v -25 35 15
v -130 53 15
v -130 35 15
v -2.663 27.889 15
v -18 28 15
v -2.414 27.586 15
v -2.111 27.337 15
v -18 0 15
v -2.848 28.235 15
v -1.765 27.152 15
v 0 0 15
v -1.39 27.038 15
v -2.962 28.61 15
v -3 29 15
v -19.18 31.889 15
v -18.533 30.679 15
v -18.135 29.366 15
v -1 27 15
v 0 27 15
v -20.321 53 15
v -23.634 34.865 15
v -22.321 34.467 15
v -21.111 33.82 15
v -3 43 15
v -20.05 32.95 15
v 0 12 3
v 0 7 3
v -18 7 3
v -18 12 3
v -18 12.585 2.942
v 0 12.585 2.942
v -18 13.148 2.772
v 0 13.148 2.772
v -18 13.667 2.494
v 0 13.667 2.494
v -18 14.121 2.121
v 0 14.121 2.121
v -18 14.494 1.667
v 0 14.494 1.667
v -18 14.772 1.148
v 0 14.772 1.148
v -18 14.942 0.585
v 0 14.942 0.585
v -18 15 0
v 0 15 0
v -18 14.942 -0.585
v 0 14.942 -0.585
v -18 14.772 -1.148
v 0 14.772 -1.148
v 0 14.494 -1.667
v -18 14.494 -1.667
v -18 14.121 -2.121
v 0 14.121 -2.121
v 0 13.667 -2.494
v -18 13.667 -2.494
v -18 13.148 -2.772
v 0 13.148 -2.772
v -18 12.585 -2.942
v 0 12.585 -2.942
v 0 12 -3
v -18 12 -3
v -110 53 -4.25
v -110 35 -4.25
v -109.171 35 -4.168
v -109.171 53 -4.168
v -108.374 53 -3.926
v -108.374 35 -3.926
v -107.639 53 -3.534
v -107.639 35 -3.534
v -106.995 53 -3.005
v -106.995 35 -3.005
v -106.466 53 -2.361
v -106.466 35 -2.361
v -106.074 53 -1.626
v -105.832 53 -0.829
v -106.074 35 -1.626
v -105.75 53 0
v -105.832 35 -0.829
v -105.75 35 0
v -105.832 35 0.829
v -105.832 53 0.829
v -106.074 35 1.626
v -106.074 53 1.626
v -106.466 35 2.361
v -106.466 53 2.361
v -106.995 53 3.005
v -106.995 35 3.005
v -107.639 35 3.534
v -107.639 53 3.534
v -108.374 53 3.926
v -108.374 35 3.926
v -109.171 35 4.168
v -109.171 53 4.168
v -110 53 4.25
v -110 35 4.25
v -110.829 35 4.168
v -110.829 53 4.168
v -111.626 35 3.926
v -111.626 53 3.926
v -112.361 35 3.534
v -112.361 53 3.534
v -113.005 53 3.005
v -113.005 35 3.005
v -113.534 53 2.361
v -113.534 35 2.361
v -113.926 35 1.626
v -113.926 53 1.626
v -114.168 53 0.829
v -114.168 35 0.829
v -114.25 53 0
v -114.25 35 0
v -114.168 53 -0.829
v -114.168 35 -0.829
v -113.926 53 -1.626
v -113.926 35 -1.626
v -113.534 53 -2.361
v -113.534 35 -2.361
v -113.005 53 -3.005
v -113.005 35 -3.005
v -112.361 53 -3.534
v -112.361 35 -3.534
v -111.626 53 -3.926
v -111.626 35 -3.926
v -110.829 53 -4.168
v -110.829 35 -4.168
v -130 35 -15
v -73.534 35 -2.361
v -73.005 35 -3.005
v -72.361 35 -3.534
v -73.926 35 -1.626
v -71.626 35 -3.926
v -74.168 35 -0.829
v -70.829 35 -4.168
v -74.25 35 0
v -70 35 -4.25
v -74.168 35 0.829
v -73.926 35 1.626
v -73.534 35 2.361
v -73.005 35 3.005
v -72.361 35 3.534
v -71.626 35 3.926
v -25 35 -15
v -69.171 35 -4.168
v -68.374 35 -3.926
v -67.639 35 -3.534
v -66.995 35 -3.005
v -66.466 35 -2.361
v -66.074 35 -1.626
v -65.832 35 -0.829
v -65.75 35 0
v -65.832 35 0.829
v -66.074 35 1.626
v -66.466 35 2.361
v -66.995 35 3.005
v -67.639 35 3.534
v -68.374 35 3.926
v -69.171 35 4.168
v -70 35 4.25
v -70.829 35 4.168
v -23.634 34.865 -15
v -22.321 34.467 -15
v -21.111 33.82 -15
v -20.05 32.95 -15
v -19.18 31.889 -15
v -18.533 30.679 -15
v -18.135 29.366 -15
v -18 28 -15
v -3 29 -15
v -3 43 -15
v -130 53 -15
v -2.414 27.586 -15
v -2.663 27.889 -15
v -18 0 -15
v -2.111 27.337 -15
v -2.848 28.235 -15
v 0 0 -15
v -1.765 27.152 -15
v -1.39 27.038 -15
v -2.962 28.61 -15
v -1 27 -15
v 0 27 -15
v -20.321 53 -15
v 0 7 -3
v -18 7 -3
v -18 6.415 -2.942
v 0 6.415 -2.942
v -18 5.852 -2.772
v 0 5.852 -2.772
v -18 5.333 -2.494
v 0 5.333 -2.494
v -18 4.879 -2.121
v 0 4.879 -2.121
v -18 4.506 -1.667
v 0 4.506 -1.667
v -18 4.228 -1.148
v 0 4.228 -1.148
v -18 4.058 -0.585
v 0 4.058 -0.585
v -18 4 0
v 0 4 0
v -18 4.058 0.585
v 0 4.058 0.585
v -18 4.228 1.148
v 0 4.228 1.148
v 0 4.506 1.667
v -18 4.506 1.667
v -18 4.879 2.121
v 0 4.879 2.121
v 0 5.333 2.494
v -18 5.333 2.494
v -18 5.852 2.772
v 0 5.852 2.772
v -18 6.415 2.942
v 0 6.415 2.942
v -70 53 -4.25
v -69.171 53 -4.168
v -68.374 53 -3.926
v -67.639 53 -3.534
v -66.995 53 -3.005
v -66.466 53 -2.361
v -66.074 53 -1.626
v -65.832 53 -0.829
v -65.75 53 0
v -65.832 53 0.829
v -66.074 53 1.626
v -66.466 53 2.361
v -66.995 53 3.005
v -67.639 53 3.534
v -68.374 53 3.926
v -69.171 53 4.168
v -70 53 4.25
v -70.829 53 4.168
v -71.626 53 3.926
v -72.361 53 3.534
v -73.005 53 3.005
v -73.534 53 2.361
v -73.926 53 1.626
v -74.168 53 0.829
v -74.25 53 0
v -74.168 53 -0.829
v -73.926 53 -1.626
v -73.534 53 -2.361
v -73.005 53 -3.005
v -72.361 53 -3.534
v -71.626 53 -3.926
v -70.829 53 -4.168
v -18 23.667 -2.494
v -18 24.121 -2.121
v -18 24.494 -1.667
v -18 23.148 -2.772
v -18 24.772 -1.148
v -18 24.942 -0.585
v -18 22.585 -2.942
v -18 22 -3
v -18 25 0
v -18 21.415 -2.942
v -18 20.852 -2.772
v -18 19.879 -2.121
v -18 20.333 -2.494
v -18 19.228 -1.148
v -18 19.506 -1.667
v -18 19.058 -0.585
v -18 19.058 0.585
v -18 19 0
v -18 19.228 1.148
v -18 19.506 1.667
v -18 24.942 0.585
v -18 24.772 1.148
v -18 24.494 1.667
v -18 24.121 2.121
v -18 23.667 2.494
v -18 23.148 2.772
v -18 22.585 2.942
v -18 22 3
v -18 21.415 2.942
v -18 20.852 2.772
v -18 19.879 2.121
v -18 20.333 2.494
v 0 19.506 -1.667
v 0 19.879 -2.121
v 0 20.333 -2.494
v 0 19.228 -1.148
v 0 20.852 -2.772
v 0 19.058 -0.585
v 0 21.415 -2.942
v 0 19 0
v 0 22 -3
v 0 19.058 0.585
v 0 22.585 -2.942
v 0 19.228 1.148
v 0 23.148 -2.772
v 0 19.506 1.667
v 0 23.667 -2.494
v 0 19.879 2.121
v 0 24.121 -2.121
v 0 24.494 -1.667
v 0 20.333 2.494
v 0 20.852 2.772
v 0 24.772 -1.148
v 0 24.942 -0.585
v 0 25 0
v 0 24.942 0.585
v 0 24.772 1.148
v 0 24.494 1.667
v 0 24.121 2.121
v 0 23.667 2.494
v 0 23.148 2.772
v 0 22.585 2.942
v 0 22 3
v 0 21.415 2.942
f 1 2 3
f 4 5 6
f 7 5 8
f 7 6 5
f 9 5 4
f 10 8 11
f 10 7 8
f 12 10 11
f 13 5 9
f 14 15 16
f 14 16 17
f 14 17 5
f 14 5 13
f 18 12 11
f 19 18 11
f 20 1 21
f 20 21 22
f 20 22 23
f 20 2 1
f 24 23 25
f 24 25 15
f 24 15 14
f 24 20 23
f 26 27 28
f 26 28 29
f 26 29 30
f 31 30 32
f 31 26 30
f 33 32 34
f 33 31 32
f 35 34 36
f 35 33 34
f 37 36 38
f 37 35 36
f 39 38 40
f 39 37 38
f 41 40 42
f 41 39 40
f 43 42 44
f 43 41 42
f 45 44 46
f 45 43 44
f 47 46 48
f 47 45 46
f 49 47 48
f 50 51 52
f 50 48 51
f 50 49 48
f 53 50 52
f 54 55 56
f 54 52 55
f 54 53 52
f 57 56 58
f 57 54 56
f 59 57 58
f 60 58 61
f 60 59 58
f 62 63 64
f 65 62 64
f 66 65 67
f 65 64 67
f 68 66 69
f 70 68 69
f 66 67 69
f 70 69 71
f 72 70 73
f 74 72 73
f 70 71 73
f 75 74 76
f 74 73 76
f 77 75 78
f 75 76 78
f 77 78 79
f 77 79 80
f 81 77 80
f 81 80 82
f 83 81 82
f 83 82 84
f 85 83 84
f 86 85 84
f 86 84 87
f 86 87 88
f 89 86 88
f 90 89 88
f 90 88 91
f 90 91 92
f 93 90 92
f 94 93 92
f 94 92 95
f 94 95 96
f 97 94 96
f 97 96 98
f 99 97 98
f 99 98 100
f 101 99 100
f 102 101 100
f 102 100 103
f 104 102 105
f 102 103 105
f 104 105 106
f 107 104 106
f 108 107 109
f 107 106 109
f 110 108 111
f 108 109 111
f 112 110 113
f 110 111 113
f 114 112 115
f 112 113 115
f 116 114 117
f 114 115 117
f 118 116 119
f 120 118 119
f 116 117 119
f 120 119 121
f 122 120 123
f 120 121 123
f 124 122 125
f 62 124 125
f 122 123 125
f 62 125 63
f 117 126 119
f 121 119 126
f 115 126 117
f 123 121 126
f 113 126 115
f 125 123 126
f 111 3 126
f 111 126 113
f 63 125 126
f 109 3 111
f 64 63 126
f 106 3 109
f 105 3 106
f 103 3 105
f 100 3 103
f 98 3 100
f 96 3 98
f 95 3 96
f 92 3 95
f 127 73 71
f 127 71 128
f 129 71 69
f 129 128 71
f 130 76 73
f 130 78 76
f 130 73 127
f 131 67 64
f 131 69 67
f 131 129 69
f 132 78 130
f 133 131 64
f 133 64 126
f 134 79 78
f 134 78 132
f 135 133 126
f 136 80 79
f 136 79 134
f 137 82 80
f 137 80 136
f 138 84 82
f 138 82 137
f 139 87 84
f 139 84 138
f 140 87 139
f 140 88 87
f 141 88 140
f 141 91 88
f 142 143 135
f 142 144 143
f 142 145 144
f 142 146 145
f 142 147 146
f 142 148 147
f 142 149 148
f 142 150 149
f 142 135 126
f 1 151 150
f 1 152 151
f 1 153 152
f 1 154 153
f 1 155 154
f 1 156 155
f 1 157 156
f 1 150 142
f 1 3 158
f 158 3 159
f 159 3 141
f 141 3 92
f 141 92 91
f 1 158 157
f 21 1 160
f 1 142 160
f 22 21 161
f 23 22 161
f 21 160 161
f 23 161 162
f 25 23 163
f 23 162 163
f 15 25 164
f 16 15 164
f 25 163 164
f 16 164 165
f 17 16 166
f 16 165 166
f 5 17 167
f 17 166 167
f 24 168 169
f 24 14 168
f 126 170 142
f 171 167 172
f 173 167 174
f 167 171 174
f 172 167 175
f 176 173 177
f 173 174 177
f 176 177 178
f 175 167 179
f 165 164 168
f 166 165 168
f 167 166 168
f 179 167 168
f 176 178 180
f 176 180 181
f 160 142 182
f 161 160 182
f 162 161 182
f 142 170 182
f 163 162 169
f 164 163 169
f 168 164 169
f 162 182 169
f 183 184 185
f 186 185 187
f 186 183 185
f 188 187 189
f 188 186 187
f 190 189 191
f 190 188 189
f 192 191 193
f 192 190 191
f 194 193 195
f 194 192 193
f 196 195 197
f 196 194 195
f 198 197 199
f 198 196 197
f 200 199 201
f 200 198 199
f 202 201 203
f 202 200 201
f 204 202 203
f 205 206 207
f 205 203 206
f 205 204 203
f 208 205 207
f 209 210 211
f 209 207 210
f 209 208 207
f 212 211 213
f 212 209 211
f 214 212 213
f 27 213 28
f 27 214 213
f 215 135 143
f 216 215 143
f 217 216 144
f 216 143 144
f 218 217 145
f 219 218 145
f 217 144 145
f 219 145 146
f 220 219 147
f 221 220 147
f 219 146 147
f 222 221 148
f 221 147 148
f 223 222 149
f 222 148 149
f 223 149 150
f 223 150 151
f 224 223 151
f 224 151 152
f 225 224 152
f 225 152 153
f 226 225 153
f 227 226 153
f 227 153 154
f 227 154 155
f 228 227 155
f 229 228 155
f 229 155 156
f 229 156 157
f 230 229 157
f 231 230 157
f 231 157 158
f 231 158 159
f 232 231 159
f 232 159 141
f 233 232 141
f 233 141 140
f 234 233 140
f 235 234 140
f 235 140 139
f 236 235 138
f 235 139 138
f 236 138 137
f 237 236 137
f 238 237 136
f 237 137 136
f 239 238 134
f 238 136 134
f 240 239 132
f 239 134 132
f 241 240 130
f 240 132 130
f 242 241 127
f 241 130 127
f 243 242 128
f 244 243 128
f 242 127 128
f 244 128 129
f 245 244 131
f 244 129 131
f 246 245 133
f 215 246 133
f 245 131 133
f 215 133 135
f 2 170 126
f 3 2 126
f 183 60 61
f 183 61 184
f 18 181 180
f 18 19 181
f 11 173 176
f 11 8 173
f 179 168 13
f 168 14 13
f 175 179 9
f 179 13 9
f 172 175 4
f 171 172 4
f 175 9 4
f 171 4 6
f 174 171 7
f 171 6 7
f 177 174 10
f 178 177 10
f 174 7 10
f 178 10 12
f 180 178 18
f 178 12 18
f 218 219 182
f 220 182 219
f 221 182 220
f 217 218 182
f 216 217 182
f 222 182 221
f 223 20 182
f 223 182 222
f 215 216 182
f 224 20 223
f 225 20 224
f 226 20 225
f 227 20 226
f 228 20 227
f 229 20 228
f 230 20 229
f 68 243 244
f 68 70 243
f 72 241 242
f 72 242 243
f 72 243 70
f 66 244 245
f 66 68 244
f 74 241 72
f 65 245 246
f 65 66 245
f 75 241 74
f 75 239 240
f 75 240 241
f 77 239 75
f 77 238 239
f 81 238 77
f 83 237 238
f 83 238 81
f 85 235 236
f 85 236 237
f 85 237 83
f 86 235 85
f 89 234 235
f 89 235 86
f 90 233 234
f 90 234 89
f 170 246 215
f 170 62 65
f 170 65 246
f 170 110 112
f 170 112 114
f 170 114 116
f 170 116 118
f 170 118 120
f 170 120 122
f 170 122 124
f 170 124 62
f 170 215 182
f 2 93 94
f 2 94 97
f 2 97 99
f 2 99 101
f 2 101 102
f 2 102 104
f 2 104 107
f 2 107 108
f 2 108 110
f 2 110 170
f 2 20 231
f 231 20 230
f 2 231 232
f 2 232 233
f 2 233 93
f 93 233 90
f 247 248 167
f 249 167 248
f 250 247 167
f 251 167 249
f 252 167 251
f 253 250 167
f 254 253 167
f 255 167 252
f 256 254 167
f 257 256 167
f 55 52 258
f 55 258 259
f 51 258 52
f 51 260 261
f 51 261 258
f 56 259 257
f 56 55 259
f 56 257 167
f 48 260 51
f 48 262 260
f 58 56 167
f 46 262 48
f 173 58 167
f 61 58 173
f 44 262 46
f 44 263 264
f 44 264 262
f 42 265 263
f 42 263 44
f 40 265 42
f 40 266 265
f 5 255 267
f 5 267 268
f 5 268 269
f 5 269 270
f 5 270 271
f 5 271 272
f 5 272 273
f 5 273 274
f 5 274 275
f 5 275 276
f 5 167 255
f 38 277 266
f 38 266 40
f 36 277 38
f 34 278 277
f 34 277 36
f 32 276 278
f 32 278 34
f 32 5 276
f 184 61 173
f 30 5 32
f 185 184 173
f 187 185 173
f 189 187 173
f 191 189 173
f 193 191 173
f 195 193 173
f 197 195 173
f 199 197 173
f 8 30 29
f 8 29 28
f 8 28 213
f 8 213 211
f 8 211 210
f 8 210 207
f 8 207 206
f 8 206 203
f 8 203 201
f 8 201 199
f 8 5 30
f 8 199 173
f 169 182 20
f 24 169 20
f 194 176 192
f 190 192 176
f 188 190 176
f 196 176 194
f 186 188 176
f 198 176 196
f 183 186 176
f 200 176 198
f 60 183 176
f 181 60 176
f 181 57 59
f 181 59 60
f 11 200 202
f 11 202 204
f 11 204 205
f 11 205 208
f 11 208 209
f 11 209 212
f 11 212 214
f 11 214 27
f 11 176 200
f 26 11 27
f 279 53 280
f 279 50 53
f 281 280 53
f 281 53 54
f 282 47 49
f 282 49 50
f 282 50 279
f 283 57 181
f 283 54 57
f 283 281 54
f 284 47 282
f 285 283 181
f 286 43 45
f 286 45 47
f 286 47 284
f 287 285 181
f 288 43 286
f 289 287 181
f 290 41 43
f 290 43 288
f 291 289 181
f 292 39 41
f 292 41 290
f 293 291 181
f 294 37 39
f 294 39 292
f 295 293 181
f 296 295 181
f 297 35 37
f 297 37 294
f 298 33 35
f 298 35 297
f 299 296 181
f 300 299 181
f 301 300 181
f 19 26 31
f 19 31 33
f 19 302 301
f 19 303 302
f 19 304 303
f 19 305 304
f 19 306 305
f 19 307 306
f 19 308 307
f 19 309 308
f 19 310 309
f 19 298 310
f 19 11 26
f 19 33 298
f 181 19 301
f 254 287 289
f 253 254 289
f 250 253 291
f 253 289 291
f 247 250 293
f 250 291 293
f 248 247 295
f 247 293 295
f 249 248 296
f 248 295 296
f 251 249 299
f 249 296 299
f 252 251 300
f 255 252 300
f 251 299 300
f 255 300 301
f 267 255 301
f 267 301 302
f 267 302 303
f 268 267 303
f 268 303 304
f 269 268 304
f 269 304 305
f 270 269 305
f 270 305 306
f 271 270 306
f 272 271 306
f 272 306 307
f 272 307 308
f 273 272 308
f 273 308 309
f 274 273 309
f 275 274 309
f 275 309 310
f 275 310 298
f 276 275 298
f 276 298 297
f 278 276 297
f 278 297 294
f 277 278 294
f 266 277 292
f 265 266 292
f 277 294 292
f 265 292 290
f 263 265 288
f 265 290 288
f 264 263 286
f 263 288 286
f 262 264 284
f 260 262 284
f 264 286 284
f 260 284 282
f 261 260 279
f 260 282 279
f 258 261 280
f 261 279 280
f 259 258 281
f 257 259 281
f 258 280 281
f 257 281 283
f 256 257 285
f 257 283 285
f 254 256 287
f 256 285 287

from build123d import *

# Parameters (mm, degrees)
BOSS_EXTRUDE1_DEPTH = 15
CUT_EXTRUDE1_REACH  = 143.188
SKETCH2_R           = 3
SKETCH3_R           = 4.25
CUT_EXTRUDE2_DEPTH  = 30
FILLET3_R           = 7
CHAMFER1_SIZE       = 10
CHAMFER1_SIZE2      = 17.320508076
FILLET4_R           = 2


with BuildPart() as part:
    # Sketch1 → Boss-Extrude1 (new, symmetric)
    with BuildSketch(Plane.XY):
        Polygon((0, 0), (0, 27), (-3, 27), (-3, 53), (-130, 53), (-130, 35), (-18, 35), (-18, 0), align=None)
    extrude(amount=BOSS_EXTRUDE1_DEPTH, both=True)

    # Sketch2 → Cut-Extrude1 (cut, up to next)
    with BuildSketch(Plane(origin=(0, 0, 0), x_dir=(0, 0, -1), z_dir=(1, 0, 0)), mode=Mode.PRIVATE) as cut_extrude1_sk1:
        with Locations((0, 22)):
            Circle(SKETCH2_R)
    cut_extrude1_tool1 = extrude(cut_extrude1_sk1.sketch, amount=-CUT_EXTRUDE1_REACH, mode=Mode.PRIVATE) & part.part
    # Sketch2 → Cut-Extrude1 (cut, up to next)
    with BuildSketch(Plane(origin=(0, 0, 0), x_dir=(0, 0, -1), z_dir=(1, 0, 0)), mode=Mode.PRIVATE) as cut_extrude1_sk2:
        with BuildLine():
            Line((3, 12), (3, 7))
            ThreePointArc((3, 7), (0, 4), (-3, 7))
            Line((-3, 7), (-3, 12))
            ThreePointArc((-3, 12), (0, 15), (3, 12))
        make_face()
    cut_extrude1_tool2 = extrude(cut_extrude1_sk2.sketch, amount=-CUT_EXTRUDE1_REACH, mode=Mode.PRIVATE) & part.part
    add(cut_extrude1_tool1.solids().sort_by_distance((0, 22, 0))[0], mode=Mode.SUBTRACT)
    add(cut_extrude1_tool2.solids().sort_by_distance((0, 9.5, 0))[0], mode=Mode.SUBTRACT)

    # Sketch3 → Cut-Extrude2 (cut)
    with BuildSketch(Plane.XZ.offset(-35)):
        with Locations(Location((-110, 0, 0), (0, 0, 270))):
            Circle(SKETCH3_R)
        with Locations(Location((-70, 0, 0), (0, 0, 270))):
            Circle(SKETCH3_R)
    extrude(amount=-CUT_EXTRUDE2_DEPTH, mode=Mode.SUBTRACT)

    # Fillet3
    fillet3_edges = [part.edges().sort_by_distance(p)[0] for p in [
        (-18, 35, 0),
    ]]
    fillet(fillet3_edges, radius=FILLET3_R)

    # Chamfer1
    chamfer1_edges = [part.edges().sort_by_distance(p)[0] for p in [
        (-3, 53, 0),
    ]]
    chamfer1_side = [part.faces().sort_by_distance(p)[0] for p in [
        (-3, 40, 0),
    ]]
    chamfer(chamfer1_edges, length=CHAMFER1_SIZE, length2=CHAMFER1_SIZE2, reference=chamfer1_side[0])

    # Fillet4
    fillet4_edges = [part.edges().sort_by_distance(p)[0] for p in [
        (-3, 27, 0),
    ]]
    fillet(fillet4_edges, radius=FILLET4_R)


solid = part.part
